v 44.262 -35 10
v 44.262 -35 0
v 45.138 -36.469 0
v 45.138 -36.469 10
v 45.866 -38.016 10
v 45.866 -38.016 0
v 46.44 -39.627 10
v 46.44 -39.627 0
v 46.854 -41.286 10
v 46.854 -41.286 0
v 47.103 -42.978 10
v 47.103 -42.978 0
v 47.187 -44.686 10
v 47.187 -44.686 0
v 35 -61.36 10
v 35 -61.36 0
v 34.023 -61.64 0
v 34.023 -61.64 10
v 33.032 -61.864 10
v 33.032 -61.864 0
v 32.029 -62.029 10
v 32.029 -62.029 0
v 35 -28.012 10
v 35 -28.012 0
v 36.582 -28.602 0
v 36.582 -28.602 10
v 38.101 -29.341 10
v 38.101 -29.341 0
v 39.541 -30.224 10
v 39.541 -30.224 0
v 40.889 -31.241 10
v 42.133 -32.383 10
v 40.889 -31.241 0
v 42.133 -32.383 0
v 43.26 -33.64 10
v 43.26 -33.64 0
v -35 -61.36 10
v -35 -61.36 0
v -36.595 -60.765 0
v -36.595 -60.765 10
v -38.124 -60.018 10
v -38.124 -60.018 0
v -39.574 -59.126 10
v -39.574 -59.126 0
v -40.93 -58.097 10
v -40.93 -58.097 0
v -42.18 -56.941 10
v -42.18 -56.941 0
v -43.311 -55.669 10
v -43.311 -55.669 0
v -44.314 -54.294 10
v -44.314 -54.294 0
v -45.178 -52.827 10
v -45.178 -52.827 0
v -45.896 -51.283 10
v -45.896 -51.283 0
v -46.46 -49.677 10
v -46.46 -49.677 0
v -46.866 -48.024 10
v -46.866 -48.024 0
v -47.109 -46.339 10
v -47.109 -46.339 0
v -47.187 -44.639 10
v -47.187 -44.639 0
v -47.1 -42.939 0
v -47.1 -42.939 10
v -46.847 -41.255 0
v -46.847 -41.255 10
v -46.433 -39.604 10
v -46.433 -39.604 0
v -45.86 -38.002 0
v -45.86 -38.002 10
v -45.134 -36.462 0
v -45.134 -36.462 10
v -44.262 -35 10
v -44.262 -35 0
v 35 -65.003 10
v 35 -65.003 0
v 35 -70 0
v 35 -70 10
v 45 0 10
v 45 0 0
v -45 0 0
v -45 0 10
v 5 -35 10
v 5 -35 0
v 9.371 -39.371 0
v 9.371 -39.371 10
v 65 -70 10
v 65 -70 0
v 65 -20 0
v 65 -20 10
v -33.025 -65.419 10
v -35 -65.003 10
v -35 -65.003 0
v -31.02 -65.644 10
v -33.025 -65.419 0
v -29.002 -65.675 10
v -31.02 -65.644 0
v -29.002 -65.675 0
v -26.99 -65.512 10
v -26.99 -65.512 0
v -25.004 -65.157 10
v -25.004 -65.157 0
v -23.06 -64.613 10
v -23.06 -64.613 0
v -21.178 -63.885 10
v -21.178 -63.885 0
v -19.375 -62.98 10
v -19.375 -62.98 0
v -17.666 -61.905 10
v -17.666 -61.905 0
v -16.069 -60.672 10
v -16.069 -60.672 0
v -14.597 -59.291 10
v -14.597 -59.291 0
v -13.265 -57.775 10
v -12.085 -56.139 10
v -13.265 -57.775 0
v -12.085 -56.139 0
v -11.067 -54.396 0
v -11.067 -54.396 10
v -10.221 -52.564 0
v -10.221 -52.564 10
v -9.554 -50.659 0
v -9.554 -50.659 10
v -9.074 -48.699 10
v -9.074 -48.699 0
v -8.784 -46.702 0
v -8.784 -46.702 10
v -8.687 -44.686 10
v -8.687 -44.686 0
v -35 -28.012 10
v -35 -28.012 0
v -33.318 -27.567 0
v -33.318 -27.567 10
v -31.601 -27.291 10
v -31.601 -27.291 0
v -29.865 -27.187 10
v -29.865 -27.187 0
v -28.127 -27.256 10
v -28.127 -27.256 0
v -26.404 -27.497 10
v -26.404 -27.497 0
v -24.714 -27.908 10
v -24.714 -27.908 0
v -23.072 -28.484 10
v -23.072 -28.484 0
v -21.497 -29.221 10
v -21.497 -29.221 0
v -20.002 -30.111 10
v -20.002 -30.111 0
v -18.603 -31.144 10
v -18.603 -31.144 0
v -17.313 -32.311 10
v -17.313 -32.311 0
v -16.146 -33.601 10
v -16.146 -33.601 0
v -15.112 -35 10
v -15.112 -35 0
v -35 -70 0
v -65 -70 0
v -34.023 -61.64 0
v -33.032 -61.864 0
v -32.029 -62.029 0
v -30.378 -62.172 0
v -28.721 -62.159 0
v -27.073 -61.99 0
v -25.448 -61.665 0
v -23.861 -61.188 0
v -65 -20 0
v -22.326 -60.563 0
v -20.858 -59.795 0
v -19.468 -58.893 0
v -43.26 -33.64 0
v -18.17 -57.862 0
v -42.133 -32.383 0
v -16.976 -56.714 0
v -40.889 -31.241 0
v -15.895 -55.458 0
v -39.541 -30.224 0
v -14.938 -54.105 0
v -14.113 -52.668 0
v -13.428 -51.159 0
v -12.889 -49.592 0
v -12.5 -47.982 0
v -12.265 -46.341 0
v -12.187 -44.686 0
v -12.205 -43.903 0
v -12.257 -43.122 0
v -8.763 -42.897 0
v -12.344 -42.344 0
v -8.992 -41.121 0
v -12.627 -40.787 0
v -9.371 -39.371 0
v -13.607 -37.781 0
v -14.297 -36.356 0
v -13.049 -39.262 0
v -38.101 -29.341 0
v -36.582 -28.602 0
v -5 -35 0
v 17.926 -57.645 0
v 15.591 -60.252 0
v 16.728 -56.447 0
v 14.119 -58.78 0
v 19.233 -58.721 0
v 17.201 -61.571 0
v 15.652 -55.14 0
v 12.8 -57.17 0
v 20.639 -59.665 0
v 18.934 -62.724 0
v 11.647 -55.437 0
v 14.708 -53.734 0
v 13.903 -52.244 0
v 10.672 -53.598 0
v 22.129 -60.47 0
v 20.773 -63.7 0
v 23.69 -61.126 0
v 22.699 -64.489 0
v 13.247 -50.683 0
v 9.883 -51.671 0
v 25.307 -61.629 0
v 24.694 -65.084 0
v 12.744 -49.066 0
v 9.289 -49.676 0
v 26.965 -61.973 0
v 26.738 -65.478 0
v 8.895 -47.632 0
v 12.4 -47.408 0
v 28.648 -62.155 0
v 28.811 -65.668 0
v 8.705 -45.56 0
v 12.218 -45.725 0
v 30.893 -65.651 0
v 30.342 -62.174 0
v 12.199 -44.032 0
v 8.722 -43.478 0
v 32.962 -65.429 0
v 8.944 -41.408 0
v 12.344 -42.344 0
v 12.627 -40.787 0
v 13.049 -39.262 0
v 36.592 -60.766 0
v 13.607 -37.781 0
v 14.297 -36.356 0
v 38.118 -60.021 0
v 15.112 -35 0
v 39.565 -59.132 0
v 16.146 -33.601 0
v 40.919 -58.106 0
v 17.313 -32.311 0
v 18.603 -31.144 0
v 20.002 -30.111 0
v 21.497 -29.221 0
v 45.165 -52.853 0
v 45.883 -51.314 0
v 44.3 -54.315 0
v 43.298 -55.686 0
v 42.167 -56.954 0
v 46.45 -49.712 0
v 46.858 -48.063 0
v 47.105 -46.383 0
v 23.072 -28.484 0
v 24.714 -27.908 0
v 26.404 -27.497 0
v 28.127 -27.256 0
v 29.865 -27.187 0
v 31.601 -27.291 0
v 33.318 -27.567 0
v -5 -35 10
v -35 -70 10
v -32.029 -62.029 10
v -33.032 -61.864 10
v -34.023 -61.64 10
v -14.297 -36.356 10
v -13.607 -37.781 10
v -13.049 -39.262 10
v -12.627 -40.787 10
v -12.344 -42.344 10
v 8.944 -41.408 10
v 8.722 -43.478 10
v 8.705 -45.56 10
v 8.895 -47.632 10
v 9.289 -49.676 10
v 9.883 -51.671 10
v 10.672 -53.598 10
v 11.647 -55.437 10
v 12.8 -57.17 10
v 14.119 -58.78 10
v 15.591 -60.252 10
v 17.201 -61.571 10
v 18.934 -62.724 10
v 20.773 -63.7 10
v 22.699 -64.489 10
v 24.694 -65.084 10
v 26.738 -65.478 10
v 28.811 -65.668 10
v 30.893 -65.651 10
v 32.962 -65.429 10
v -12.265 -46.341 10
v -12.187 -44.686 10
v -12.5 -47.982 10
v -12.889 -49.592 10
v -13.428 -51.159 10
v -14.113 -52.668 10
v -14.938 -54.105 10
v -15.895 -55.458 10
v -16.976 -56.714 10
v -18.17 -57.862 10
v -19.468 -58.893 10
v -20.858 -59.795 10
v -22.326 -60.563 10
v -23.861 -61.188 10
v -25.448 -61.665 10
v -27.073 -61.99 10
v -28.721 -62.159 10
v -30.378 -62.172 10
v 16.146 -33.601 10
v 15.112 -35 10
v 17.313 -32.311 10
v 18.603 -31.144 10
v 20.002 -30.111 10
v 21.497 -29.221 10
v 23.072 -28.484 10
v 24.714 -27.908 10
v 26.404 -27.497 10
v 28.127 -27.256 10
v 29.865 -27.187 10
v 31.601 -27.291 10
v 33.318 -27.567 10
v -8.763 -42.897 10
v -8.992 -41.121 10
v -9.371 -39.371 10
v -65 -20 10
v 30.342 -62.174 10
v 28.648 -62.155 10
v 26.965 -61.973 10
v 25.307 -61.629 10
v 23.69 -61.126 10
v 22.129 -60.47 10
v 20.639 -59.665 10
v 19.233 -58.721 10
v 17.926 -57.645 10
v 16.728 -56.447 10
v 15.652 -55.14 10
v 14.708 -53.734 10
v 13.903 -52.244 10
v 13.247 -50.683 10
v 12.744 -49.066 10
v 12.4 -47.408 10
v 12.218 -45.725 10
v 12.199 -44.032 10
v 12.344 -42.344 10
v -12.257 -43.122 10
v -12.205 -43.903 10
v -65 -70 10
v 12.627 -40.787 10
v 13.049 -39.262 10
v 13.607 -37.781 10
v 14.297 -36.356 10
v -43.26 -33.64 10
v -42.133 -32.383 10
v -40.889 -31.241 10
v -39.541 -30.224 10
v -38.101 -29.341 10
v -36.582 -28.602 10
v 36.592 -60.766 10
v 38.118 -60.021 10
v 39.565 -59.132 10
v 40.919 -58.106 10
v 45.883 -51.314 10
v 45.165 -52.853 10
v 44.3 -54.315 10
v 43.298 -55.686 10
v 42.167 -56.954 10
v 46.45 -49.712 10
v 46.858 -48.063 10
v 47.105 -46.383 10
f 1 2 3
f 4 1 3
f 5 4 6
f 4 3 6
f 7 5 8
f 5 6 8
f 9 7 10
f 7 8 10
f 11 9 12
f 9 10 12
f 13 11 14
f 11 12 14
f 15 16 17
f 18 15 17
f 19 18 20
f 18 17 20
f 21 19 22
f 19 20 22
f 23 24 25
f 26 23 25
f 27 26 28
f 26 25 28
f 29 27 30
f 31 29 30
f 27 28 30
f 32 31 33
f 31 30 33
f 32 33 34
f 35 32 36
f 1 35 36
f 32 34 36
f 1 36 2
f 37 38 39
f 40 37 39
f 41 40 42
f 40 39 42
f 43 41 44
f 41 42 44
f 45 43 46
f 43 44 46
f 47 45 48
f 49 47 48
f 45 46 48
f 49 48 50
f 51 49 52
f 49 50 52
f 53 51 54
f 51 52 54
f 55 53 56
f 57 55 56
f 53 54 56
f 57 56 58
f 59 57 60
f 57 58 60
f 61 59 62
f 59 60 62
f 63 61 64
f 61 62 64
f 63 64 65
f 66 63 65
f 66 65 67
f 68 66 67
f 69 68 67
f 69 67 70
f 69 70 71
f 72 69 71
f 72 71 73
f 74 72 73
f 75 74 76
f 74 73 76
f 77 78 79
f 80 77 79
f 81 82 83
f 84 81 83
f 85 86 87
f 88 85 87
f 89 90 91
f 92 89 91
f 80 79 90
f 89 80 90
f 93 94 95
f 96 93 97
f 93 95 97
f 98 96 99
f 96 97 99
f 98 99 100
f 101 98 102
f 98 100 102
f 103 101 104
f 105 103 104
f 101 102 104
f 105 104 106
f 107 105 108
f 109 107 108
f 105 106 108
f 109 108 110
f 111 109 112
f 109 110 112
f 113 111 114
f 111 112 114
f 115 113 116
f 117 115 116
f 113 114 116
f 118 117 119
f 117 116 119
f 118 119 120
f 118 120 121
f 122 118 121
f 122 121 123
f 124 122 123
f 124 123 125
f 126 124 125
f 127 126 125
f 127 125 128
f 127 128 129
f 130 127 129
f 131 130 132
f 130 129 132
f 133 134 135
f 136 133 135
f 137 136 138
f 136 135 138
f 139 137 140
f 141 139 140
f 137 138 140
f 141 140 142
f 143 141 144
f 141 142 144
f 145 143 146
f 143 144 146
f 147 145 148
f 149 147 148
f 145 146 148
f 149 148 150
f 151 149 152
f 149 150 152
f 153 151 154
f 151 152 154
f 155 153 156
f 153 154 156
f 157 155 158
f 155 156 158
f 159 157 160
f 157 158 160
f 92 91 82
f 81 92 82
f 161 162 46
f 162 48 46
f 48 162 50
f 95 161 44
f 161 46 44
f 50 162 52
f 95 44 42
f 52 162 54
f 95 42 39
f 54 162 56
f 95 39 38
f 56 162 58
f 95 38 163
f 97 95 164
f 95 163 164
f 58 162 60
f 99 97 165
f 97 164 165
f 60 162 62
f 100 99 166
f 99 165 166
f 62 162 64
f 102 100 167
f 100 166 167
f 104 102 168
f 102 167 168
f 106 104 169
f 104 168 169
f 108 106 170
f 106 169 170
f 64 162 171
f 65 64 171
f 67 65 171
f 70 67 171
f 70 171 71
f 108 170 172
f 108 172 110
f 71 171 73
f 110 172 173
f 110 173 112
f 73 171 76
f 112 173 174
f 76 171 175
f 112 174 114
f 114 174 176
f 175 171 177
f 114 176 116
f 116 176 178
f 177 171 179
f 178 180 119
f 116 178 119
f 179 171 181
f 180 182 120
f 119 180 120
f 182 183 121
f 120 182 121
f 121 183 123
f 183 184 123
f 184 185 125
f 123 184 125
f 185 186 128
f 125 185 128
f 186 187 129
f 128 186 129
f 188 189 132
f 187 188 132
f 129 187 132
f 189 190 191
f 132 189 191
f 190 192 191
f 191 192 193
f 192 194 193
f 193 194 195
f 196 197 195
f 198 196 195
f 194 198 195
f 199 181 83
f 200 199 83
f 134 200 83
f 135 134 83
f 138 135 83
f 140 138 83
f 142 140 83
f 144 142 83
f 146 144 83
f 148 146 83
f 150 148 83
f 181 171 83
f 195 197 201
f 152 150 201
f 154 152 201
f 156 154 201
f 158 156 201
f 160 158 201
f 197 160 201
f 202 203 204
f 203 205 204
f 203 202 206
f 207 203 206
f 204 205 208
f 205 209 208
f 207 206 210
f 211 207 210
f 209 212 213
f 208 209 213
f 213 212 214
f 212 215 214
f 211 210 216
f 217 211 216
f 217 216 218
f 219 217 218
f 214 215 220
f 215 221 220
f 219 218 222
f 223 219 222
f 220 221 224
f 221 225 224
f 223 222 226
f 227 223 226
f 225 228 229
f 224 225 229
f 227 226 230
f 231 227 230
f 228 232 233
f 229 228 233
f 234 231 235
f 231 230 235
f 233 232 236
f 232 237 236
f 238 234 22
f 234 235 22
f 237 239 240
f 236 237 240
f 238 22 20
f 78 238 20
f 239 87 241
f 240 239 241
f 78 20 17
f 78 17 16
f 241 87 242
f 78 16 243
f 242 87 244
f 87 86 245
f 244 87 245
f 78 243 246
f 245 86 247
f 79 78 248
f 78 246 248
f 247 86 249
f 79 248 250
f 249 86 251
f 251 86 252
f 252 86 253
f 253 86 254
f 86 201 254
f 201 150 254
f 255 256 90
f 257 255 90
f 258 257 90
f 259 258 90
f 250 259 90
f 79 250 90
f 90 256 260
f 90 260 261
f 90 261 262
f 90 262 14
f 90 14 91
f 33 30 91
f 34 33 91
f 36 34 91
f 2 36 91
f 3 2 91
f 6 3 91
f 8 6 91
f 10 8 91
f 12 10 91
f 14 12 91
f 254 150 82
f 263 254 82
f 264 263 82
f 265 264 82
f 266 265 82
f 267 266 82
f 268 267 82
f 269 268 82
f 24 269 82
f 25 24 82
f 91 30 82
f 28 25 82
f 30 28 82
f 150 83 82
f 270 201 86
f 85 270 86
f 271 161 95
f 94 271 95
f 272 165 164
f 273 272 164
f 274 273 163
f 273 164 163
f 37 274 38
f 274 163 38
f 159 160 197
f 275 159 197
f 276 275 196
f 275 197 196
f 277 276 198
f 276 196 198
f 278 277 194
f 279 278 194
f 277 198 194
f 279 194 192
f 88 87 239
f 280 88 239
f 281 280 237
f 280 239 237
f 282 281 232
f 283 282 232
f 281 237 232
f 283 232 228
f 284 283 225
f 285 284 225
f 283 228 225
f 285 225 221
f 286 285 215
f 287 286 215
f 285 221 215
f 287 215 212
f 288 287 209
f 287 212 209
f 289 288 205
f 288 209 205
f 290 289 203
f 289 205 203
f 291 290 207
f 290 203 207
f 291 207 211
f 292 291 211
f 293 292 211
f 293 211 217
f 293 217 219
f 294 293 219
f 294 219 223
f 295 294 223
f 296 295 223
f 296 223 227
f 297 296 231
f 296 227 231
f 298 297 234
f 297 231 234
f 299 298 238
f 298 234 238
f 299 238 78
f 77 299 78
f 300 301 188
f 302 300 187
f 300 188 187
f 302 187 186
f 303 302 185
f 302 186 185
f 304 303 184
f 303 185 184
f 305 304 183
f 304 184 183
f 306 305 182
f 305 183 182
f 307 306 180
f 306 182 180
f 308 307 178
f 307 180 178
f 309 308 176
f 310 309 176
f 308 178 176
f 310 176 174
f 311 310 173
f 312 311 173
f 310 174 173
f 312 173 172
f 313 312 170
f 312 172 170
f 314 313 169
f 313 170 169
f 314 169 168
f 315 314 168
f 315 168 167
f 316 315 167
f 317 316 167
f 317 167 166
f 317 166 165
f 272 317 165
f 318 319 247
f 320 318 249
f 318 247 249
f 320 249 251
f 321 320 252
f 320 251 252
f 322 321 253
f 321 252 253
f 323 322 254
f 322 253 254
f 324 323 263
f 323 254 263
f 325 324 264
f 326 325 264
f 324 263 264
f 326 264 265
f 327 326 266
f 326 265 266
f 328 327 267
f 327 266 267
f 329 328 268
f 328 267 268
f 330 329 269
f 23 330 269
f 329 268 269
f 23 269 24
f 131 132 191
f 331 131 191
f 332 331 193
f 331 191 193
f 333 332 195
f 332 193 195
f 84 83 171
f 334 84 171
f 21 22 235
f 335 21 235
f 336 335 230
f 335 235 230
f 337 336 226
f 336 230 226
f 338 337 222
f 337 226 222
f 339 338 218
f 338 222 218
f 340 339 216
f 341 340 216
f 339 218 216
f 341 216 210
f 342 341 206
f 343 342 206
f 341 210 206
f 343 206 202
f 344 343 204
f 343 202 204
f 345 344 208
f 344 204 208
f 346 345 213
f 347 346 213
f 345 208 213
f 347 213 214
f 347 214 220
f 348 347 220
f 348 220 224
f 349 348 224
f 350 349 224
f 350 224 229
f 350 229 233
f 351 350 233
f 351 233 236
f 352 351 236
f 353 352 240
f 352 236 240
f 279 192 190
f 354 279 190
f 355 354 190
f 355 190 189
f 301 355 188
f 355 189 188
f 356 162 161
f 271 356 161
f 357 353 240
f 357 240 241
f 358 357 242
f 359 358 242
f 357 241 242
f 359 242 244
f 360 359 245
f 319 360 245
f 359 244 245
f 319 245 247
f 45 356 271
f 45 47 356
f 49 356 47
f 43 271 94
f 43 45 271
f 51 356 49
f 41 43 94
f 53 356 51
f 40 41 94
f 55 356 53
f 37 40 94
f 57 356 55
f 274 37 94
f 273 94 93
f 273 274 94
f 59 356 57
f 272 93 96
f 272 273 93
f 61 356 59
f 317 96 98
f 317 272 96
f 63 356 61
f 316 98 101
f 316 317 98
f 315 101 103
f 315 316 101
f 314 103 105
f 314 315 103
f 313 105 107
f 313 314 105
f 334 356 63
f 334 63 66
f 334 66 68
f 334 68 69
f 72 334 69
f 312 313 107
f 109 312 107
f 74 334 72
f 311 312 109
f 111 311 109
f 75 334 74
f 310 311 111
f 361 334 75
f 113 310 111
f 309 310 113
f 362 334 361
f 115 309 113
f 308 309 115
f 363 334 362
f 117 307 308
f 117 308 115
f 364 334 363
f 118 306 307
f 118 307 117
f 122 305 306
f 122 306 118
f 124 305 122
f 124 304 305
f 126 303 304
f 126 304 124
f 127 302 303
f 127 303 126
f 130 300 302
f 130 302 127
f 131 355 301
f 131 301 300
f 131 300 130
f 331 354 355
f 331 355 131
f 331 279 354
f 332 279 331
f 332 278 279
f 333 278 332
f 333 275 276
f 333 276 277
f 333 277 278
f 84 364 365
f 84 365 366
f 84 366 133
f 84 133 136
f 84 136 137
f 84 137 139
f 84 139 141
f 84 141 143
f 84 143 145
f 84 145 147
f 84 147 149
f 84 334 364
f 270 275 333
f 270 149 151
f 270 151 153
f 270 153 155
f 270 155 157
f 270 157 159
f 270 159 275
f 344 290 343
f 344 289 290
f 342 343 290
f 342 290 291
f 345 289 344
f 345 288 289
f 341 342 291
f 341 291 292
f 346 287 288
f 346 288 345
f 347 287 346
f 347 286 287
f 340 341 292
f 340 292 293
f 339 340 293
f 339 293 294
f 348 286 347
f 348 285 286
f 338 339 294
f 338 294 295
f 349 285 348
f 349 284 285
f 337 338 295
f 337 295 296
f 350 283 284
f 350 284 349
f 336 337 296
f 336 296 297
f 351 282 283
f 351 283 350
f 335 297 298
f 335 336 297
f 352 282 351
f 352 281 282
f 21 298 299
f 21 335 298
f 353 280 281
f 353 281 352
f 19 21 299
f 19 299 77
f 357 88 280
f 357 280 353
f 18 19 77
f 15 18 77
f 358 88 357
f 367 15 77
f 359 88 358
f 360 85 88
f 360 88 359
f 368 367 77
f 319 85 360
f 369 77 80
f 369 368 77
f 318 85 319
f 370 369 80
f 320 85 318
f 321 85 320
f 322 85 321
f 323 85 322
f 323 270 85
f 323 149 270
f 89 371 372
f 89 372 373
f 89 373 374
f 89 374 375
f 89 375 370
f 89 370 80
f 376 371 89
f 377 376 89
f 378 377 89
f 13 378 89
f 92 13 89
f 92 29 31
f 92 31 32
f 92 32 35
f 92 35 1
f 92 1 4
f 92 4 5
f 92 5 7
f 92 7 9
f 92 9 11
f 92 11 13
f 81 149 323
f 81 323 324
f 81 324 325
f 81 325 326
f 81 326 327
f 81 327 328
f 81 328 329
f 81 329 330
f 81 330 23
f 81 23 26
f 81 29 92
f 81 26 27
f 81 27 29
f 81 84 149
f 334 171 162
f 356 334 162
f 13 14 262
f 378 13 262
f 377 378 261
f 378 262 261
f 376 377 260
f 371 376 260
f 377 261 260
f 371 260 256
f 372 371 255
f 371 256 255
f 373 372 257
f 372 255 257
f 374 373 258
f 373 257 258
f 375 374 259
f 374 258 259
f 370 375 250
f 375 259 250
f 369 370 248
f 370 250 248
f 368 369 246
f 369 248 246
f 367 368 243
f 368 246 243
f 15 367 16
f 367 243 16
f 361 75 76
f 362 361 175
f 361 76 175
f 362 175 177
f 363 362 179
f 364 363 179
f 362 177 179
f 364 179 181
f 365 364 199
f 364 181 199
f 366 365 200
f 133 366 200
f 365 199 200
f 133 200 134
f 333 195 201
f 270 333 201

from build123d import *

# Parameters (mm, degrees)
F1_DEPTH = 10


with BuildPart() as f1:
    # F0 (on Top) → F1 (new body)
    with BuildSketch(Plane.XY):
        with BuildLine():
            Line((45, 0), (0, 0))
            Line((0, 0), (0, -35))
            Line((0, -35), (5, -35))
            Line((5, -35), (11.0542490694, -35))
            ThreePointArc((11.0542490694, -35), (21.1660409917, -25.4925456214), (35, -24.3693346885))
            Line((35, -24.3693346885), (35, -20))
            Line((35, -20), (45, -20))
            Line((45, -20), (45, 0))
        make_face()
        with BuildLine():
            Line((0, -35), (0, 0))
            Line((0, 0), (-45, 0))
            Line((-45, 0), (-45, -20))
            Line((-45, -20), (-35, -20))
            Line((-35, -20), (-35, -24.3693346885))
            ThreePointArc((-35, -24.3693346885), (-21.1660409917, -25.4925456214), (-11.0542490694, -35))
            Line((-11.0542490694, -35), (-5, -35))
            Line((-5, -35), (0, -35))
        make_face()
        Polygon((65, -20), (45, 0), (45, -20), align=None)
        Polygon((-45, -20), (-45, 0), (-65, -20), align=None)
        with BuildLine():
            Line((65, -20), (45, -20))
            Line((45, -20), (45, -30.3156087011))
            ThreePointArc((45, -30.3156087011), (49.2135509862, -36.9586799562), (50.6869892627, -44.6861237288))
            ThreePointArc((50.6869892627, -44.6861237288), (46.3088607801, -57.5201950726), (35, -65.002912769))
            Line((35, -65.002912769), (35, -70))
            Line((35, -70), (65, -70))
            Line((65, -70), (65, -20))
        make_face()
        with BuildLine():
            Line((45, -30.3156087011), (45, -20))
            Line((45, -20), (35, -20))
            Line((35, -20), (35, -24.3693346885))
            ThreePointArc((35, -24.3693346885), (40.420009999, -26.6361302142), (45, -30.3156087011))
        make_face()
        with BuildLine():
            Line((11.0542490694, -35), (5, -35))
            Line((5, -35), (9.3708041453, -39.3708041453))
            ThreePointArc((9.3708041453, -39.3708041453), (10.0902885727, -37.1383212628), (11.0542490694, -35))
        make_face()
        with BuildLine():
            Line((-9.3708041453, -39.3708041453), (-5, -35))
            Line((-5, -35), (-11.0542490694, -35))
            ThreePointArc((-11.0542490694, -35), (-10.0902885727, -37.1383212628), (-9.3708041453, -39.3708041453))
        make_face()
        with BuildLine():
            Line((-35, -20), (-45, -20))
            Line((-45, -20), (-45, -30.3156087011))
            ThreePointArc((-45, -30.3156087011), (-40.420009999, -26.6361302142), (-35, -24.3693346885))
            Line((-35, -24.3693346885), (-35, -20))
        make_face()
        with BuildLine():
            Line((-45, -30.3156087011), (-45, -20))
            Line((-45, -20), (-65, -20))
            Line((-65, -20), (-65, -70))
            Line((-65, -70), (-35, -70))
            Line((-35, -70), (-35, -65.002912769))
            ThreePointArc((-35, -65.002912769), (-49.8652066354, -50.5033003341), (-45, -30.3156087011))
        make_face()
        with BuildLine():
            ThreePointArc((50.6869892627, -44.6861237288), (49.2135509862, -36.9586799562), (45, -30.3156087011))
            Line((45, -30.3156087011), (45, -35))
            Line((45, -35), (44.2619337604, -35))
            ThreePointArc((44.2619337604, -35), (46.439773042, -39.6270491449), (47.1869892627, -44.6861237288))
            ThreePointArc((47.1869892627, -44.6861237288), (43.815465612, -55.0126021241), (35, -61.3601129606))
            Line((35, -61.3601129606), (35, -65))
            Line((35, -65), (35, -65.002912769))
            ThreePointArc((35, -65.002912769), (46.3088607801, -57.5201950726), (50.6869892627, -44.6861237288))
        make_face()
        with BuildLine():
            Line((45, -35), (45, -30.3156087011))
            ThreePointArc((45, -30.3156087011), (40.420009999, -26.6361302142), (35, -24.3693346885))
            Line((35, -24.3693346885), (35, -28.0121344969))
            ThreePointArc((35, -28.0121344969), (40.2269255495, -30.7161651365), (44.2619337604, -35))
            Line((44.2619337604, -35), (45, -35))
        make_face()
        with BuildLine():
            ThreePointArc((35, -24.3693346885), (21.1660409917, -25.4925456214), (11.0542490694, -35))
            Line((11.0542490694, -35), (15.112044765, -35))
            ThreePointArc((15.112044765, -35), (23.8858324541, -28.1756246545), (35, -28.0121344969))
            Line((35, -28.0121344969), (35, -24.3693346885))
        make_face()
        with BuildLine():
            Line((15.112044765, -35), (11.0542490694, -35))
            ThreePointArc((11.0542490694, -35), (10.0902885727, -37.1383212628), (9.3708041453, -39.3708041453))
            Line((9.3708041453, -39.3708041453), (12.344376437, -42.344376437))
            ThreePointArc((12.344376437, -42.344376437), (13.311166148, -38.5150284196), (15.112044765, -35))
        make_face()
        with BuildLine():
            Line((12.344376437, -42.344376437), (9.3708041453, -39.3708041453))
            ThreePointArc((9.3708041453, -39.3708041453), (14.8369031184, -59.5345223463), (35, -65.002912769))
            Line((35, -65.002912769), (35, -65))
            Line((35, -65), (32.0287365544, -62.0287365544))
            ThreePointArc((32.0287365544, -62.0287365544), (17.3126205919, -57.0604923995), (12.344376437, -42.344376437))
        make_face()
        with BuildLine():
            Line((-12.344376437, -42.344376437), (-9.3708041453, -39.3708041453))
            ThreePointArc((-9.3708041453, -39.3708041453), (-10.0902885727, -37.1383212628), (-11.0542490694, -35))
            Line((-11.0542490694, -35), (-15.112044765, -35))
            ThreePointArc((-15.112044765, -35), (-13.311166148, -38.5150284196), (-12.344376437, -42.344376437))
        make_face()
        with BuildLine():
            ThreePointArc((-8.6869892627, -44.6861237288), (-8.8586445437, -42.006561028), (-9.3708041453, -39.3708041453))
            Line((-9.3708041453, -39.3708041453), (-12.344376437, -42.344376437))
            ThreePointArc((-12.344376437, -42.344376437), (-12.2263803894, -43.5126085924), (-12.1869892627, -44.6861237288))
            ThreePointArc((-12.1869892627, -44.6861237288), (-18.1702748355, -57.8624391774), (-32.0287365544, -62.0287365544))
            Line((-32.0287365544, -62.0287365544), (-35, -65))
            Line((-35, -65), (-35, -65.002912769))
            ThreePointArc((-35, -65.002912769), (-16.8529179189, -61.3079952462), (-8.6869892627, -44.6861237288))
        make_face()
        with BuildLine():
            Line((-15.112044765, -35), (-11.0542490694, -35))
            ThreePointArc((-11.0542490694, -35), (-21.1660409917, -25.4925456214), (-35, -24.3693346885))
            Line((-35, -24.3693346885), (-35, -28.0121344969))
            ThreePointArc((-35, -28.0121344969), (-23.8858324541, -28.1756246545), (-15.112044765, -35))
        make_face()
        with BuildLine():
            ThreePointArc((-35, -24.3693346885), (-40.420009999, -26.6361302142), (-45, -30.3156087011))
            Line((-45, -30.3156087011), (-45, -35))
            Line((-45, -35), (-44.2619337604, -35))
            ThreePointArc((-44.2619337604, -35), (-40.2269255495, -30.7161651365), (-35, -28.0121344969))
            Line((-35, -28.0121344969), (-35, -24.3693346885))
        make_face()
        with BuildLine():
            Line((-45, -35), (-45, -30.3156087011))
            ThreePointArc((-45, -30.3156087011), (-49.8652066354, -50.5033003341), (-35, -65.002912769))
            Line((-35, -65.002912769), (-35, -65))
            Line((-35, -65), (-35, -61.3601129606))
            ThreePointArc((-35, -61.3601129606), (-46.197488337, -50.4872805374), (-44.2619337604, -35))
            Line((-44.2619337604, -35), (-45, -35))
        make_face()
        with BuildLine():
            ThreePointArc((35, -61.3601129606), (33.5289411752, -61.7591845411), (32.0287365544, -62.0287365544))
            Line((32.0287365544, -62.0287365544), (35, -65))
            Line((35, -65), (35, -61.3601129606))
        make_face()
        with BuildLine():
            Line((-35, -65), (-32.0287365544, -62.0287365544))
            ThreePointArc((-32.0287365544, -62.0287365544), (-33.5289411752, -61.7591845411), (-35, -61.3601129606))
            Line((-35, -61.3601129606), (-35, -65))
        make_face()
    extrude(amount=F1_DEPTH)


solid = f1.part
